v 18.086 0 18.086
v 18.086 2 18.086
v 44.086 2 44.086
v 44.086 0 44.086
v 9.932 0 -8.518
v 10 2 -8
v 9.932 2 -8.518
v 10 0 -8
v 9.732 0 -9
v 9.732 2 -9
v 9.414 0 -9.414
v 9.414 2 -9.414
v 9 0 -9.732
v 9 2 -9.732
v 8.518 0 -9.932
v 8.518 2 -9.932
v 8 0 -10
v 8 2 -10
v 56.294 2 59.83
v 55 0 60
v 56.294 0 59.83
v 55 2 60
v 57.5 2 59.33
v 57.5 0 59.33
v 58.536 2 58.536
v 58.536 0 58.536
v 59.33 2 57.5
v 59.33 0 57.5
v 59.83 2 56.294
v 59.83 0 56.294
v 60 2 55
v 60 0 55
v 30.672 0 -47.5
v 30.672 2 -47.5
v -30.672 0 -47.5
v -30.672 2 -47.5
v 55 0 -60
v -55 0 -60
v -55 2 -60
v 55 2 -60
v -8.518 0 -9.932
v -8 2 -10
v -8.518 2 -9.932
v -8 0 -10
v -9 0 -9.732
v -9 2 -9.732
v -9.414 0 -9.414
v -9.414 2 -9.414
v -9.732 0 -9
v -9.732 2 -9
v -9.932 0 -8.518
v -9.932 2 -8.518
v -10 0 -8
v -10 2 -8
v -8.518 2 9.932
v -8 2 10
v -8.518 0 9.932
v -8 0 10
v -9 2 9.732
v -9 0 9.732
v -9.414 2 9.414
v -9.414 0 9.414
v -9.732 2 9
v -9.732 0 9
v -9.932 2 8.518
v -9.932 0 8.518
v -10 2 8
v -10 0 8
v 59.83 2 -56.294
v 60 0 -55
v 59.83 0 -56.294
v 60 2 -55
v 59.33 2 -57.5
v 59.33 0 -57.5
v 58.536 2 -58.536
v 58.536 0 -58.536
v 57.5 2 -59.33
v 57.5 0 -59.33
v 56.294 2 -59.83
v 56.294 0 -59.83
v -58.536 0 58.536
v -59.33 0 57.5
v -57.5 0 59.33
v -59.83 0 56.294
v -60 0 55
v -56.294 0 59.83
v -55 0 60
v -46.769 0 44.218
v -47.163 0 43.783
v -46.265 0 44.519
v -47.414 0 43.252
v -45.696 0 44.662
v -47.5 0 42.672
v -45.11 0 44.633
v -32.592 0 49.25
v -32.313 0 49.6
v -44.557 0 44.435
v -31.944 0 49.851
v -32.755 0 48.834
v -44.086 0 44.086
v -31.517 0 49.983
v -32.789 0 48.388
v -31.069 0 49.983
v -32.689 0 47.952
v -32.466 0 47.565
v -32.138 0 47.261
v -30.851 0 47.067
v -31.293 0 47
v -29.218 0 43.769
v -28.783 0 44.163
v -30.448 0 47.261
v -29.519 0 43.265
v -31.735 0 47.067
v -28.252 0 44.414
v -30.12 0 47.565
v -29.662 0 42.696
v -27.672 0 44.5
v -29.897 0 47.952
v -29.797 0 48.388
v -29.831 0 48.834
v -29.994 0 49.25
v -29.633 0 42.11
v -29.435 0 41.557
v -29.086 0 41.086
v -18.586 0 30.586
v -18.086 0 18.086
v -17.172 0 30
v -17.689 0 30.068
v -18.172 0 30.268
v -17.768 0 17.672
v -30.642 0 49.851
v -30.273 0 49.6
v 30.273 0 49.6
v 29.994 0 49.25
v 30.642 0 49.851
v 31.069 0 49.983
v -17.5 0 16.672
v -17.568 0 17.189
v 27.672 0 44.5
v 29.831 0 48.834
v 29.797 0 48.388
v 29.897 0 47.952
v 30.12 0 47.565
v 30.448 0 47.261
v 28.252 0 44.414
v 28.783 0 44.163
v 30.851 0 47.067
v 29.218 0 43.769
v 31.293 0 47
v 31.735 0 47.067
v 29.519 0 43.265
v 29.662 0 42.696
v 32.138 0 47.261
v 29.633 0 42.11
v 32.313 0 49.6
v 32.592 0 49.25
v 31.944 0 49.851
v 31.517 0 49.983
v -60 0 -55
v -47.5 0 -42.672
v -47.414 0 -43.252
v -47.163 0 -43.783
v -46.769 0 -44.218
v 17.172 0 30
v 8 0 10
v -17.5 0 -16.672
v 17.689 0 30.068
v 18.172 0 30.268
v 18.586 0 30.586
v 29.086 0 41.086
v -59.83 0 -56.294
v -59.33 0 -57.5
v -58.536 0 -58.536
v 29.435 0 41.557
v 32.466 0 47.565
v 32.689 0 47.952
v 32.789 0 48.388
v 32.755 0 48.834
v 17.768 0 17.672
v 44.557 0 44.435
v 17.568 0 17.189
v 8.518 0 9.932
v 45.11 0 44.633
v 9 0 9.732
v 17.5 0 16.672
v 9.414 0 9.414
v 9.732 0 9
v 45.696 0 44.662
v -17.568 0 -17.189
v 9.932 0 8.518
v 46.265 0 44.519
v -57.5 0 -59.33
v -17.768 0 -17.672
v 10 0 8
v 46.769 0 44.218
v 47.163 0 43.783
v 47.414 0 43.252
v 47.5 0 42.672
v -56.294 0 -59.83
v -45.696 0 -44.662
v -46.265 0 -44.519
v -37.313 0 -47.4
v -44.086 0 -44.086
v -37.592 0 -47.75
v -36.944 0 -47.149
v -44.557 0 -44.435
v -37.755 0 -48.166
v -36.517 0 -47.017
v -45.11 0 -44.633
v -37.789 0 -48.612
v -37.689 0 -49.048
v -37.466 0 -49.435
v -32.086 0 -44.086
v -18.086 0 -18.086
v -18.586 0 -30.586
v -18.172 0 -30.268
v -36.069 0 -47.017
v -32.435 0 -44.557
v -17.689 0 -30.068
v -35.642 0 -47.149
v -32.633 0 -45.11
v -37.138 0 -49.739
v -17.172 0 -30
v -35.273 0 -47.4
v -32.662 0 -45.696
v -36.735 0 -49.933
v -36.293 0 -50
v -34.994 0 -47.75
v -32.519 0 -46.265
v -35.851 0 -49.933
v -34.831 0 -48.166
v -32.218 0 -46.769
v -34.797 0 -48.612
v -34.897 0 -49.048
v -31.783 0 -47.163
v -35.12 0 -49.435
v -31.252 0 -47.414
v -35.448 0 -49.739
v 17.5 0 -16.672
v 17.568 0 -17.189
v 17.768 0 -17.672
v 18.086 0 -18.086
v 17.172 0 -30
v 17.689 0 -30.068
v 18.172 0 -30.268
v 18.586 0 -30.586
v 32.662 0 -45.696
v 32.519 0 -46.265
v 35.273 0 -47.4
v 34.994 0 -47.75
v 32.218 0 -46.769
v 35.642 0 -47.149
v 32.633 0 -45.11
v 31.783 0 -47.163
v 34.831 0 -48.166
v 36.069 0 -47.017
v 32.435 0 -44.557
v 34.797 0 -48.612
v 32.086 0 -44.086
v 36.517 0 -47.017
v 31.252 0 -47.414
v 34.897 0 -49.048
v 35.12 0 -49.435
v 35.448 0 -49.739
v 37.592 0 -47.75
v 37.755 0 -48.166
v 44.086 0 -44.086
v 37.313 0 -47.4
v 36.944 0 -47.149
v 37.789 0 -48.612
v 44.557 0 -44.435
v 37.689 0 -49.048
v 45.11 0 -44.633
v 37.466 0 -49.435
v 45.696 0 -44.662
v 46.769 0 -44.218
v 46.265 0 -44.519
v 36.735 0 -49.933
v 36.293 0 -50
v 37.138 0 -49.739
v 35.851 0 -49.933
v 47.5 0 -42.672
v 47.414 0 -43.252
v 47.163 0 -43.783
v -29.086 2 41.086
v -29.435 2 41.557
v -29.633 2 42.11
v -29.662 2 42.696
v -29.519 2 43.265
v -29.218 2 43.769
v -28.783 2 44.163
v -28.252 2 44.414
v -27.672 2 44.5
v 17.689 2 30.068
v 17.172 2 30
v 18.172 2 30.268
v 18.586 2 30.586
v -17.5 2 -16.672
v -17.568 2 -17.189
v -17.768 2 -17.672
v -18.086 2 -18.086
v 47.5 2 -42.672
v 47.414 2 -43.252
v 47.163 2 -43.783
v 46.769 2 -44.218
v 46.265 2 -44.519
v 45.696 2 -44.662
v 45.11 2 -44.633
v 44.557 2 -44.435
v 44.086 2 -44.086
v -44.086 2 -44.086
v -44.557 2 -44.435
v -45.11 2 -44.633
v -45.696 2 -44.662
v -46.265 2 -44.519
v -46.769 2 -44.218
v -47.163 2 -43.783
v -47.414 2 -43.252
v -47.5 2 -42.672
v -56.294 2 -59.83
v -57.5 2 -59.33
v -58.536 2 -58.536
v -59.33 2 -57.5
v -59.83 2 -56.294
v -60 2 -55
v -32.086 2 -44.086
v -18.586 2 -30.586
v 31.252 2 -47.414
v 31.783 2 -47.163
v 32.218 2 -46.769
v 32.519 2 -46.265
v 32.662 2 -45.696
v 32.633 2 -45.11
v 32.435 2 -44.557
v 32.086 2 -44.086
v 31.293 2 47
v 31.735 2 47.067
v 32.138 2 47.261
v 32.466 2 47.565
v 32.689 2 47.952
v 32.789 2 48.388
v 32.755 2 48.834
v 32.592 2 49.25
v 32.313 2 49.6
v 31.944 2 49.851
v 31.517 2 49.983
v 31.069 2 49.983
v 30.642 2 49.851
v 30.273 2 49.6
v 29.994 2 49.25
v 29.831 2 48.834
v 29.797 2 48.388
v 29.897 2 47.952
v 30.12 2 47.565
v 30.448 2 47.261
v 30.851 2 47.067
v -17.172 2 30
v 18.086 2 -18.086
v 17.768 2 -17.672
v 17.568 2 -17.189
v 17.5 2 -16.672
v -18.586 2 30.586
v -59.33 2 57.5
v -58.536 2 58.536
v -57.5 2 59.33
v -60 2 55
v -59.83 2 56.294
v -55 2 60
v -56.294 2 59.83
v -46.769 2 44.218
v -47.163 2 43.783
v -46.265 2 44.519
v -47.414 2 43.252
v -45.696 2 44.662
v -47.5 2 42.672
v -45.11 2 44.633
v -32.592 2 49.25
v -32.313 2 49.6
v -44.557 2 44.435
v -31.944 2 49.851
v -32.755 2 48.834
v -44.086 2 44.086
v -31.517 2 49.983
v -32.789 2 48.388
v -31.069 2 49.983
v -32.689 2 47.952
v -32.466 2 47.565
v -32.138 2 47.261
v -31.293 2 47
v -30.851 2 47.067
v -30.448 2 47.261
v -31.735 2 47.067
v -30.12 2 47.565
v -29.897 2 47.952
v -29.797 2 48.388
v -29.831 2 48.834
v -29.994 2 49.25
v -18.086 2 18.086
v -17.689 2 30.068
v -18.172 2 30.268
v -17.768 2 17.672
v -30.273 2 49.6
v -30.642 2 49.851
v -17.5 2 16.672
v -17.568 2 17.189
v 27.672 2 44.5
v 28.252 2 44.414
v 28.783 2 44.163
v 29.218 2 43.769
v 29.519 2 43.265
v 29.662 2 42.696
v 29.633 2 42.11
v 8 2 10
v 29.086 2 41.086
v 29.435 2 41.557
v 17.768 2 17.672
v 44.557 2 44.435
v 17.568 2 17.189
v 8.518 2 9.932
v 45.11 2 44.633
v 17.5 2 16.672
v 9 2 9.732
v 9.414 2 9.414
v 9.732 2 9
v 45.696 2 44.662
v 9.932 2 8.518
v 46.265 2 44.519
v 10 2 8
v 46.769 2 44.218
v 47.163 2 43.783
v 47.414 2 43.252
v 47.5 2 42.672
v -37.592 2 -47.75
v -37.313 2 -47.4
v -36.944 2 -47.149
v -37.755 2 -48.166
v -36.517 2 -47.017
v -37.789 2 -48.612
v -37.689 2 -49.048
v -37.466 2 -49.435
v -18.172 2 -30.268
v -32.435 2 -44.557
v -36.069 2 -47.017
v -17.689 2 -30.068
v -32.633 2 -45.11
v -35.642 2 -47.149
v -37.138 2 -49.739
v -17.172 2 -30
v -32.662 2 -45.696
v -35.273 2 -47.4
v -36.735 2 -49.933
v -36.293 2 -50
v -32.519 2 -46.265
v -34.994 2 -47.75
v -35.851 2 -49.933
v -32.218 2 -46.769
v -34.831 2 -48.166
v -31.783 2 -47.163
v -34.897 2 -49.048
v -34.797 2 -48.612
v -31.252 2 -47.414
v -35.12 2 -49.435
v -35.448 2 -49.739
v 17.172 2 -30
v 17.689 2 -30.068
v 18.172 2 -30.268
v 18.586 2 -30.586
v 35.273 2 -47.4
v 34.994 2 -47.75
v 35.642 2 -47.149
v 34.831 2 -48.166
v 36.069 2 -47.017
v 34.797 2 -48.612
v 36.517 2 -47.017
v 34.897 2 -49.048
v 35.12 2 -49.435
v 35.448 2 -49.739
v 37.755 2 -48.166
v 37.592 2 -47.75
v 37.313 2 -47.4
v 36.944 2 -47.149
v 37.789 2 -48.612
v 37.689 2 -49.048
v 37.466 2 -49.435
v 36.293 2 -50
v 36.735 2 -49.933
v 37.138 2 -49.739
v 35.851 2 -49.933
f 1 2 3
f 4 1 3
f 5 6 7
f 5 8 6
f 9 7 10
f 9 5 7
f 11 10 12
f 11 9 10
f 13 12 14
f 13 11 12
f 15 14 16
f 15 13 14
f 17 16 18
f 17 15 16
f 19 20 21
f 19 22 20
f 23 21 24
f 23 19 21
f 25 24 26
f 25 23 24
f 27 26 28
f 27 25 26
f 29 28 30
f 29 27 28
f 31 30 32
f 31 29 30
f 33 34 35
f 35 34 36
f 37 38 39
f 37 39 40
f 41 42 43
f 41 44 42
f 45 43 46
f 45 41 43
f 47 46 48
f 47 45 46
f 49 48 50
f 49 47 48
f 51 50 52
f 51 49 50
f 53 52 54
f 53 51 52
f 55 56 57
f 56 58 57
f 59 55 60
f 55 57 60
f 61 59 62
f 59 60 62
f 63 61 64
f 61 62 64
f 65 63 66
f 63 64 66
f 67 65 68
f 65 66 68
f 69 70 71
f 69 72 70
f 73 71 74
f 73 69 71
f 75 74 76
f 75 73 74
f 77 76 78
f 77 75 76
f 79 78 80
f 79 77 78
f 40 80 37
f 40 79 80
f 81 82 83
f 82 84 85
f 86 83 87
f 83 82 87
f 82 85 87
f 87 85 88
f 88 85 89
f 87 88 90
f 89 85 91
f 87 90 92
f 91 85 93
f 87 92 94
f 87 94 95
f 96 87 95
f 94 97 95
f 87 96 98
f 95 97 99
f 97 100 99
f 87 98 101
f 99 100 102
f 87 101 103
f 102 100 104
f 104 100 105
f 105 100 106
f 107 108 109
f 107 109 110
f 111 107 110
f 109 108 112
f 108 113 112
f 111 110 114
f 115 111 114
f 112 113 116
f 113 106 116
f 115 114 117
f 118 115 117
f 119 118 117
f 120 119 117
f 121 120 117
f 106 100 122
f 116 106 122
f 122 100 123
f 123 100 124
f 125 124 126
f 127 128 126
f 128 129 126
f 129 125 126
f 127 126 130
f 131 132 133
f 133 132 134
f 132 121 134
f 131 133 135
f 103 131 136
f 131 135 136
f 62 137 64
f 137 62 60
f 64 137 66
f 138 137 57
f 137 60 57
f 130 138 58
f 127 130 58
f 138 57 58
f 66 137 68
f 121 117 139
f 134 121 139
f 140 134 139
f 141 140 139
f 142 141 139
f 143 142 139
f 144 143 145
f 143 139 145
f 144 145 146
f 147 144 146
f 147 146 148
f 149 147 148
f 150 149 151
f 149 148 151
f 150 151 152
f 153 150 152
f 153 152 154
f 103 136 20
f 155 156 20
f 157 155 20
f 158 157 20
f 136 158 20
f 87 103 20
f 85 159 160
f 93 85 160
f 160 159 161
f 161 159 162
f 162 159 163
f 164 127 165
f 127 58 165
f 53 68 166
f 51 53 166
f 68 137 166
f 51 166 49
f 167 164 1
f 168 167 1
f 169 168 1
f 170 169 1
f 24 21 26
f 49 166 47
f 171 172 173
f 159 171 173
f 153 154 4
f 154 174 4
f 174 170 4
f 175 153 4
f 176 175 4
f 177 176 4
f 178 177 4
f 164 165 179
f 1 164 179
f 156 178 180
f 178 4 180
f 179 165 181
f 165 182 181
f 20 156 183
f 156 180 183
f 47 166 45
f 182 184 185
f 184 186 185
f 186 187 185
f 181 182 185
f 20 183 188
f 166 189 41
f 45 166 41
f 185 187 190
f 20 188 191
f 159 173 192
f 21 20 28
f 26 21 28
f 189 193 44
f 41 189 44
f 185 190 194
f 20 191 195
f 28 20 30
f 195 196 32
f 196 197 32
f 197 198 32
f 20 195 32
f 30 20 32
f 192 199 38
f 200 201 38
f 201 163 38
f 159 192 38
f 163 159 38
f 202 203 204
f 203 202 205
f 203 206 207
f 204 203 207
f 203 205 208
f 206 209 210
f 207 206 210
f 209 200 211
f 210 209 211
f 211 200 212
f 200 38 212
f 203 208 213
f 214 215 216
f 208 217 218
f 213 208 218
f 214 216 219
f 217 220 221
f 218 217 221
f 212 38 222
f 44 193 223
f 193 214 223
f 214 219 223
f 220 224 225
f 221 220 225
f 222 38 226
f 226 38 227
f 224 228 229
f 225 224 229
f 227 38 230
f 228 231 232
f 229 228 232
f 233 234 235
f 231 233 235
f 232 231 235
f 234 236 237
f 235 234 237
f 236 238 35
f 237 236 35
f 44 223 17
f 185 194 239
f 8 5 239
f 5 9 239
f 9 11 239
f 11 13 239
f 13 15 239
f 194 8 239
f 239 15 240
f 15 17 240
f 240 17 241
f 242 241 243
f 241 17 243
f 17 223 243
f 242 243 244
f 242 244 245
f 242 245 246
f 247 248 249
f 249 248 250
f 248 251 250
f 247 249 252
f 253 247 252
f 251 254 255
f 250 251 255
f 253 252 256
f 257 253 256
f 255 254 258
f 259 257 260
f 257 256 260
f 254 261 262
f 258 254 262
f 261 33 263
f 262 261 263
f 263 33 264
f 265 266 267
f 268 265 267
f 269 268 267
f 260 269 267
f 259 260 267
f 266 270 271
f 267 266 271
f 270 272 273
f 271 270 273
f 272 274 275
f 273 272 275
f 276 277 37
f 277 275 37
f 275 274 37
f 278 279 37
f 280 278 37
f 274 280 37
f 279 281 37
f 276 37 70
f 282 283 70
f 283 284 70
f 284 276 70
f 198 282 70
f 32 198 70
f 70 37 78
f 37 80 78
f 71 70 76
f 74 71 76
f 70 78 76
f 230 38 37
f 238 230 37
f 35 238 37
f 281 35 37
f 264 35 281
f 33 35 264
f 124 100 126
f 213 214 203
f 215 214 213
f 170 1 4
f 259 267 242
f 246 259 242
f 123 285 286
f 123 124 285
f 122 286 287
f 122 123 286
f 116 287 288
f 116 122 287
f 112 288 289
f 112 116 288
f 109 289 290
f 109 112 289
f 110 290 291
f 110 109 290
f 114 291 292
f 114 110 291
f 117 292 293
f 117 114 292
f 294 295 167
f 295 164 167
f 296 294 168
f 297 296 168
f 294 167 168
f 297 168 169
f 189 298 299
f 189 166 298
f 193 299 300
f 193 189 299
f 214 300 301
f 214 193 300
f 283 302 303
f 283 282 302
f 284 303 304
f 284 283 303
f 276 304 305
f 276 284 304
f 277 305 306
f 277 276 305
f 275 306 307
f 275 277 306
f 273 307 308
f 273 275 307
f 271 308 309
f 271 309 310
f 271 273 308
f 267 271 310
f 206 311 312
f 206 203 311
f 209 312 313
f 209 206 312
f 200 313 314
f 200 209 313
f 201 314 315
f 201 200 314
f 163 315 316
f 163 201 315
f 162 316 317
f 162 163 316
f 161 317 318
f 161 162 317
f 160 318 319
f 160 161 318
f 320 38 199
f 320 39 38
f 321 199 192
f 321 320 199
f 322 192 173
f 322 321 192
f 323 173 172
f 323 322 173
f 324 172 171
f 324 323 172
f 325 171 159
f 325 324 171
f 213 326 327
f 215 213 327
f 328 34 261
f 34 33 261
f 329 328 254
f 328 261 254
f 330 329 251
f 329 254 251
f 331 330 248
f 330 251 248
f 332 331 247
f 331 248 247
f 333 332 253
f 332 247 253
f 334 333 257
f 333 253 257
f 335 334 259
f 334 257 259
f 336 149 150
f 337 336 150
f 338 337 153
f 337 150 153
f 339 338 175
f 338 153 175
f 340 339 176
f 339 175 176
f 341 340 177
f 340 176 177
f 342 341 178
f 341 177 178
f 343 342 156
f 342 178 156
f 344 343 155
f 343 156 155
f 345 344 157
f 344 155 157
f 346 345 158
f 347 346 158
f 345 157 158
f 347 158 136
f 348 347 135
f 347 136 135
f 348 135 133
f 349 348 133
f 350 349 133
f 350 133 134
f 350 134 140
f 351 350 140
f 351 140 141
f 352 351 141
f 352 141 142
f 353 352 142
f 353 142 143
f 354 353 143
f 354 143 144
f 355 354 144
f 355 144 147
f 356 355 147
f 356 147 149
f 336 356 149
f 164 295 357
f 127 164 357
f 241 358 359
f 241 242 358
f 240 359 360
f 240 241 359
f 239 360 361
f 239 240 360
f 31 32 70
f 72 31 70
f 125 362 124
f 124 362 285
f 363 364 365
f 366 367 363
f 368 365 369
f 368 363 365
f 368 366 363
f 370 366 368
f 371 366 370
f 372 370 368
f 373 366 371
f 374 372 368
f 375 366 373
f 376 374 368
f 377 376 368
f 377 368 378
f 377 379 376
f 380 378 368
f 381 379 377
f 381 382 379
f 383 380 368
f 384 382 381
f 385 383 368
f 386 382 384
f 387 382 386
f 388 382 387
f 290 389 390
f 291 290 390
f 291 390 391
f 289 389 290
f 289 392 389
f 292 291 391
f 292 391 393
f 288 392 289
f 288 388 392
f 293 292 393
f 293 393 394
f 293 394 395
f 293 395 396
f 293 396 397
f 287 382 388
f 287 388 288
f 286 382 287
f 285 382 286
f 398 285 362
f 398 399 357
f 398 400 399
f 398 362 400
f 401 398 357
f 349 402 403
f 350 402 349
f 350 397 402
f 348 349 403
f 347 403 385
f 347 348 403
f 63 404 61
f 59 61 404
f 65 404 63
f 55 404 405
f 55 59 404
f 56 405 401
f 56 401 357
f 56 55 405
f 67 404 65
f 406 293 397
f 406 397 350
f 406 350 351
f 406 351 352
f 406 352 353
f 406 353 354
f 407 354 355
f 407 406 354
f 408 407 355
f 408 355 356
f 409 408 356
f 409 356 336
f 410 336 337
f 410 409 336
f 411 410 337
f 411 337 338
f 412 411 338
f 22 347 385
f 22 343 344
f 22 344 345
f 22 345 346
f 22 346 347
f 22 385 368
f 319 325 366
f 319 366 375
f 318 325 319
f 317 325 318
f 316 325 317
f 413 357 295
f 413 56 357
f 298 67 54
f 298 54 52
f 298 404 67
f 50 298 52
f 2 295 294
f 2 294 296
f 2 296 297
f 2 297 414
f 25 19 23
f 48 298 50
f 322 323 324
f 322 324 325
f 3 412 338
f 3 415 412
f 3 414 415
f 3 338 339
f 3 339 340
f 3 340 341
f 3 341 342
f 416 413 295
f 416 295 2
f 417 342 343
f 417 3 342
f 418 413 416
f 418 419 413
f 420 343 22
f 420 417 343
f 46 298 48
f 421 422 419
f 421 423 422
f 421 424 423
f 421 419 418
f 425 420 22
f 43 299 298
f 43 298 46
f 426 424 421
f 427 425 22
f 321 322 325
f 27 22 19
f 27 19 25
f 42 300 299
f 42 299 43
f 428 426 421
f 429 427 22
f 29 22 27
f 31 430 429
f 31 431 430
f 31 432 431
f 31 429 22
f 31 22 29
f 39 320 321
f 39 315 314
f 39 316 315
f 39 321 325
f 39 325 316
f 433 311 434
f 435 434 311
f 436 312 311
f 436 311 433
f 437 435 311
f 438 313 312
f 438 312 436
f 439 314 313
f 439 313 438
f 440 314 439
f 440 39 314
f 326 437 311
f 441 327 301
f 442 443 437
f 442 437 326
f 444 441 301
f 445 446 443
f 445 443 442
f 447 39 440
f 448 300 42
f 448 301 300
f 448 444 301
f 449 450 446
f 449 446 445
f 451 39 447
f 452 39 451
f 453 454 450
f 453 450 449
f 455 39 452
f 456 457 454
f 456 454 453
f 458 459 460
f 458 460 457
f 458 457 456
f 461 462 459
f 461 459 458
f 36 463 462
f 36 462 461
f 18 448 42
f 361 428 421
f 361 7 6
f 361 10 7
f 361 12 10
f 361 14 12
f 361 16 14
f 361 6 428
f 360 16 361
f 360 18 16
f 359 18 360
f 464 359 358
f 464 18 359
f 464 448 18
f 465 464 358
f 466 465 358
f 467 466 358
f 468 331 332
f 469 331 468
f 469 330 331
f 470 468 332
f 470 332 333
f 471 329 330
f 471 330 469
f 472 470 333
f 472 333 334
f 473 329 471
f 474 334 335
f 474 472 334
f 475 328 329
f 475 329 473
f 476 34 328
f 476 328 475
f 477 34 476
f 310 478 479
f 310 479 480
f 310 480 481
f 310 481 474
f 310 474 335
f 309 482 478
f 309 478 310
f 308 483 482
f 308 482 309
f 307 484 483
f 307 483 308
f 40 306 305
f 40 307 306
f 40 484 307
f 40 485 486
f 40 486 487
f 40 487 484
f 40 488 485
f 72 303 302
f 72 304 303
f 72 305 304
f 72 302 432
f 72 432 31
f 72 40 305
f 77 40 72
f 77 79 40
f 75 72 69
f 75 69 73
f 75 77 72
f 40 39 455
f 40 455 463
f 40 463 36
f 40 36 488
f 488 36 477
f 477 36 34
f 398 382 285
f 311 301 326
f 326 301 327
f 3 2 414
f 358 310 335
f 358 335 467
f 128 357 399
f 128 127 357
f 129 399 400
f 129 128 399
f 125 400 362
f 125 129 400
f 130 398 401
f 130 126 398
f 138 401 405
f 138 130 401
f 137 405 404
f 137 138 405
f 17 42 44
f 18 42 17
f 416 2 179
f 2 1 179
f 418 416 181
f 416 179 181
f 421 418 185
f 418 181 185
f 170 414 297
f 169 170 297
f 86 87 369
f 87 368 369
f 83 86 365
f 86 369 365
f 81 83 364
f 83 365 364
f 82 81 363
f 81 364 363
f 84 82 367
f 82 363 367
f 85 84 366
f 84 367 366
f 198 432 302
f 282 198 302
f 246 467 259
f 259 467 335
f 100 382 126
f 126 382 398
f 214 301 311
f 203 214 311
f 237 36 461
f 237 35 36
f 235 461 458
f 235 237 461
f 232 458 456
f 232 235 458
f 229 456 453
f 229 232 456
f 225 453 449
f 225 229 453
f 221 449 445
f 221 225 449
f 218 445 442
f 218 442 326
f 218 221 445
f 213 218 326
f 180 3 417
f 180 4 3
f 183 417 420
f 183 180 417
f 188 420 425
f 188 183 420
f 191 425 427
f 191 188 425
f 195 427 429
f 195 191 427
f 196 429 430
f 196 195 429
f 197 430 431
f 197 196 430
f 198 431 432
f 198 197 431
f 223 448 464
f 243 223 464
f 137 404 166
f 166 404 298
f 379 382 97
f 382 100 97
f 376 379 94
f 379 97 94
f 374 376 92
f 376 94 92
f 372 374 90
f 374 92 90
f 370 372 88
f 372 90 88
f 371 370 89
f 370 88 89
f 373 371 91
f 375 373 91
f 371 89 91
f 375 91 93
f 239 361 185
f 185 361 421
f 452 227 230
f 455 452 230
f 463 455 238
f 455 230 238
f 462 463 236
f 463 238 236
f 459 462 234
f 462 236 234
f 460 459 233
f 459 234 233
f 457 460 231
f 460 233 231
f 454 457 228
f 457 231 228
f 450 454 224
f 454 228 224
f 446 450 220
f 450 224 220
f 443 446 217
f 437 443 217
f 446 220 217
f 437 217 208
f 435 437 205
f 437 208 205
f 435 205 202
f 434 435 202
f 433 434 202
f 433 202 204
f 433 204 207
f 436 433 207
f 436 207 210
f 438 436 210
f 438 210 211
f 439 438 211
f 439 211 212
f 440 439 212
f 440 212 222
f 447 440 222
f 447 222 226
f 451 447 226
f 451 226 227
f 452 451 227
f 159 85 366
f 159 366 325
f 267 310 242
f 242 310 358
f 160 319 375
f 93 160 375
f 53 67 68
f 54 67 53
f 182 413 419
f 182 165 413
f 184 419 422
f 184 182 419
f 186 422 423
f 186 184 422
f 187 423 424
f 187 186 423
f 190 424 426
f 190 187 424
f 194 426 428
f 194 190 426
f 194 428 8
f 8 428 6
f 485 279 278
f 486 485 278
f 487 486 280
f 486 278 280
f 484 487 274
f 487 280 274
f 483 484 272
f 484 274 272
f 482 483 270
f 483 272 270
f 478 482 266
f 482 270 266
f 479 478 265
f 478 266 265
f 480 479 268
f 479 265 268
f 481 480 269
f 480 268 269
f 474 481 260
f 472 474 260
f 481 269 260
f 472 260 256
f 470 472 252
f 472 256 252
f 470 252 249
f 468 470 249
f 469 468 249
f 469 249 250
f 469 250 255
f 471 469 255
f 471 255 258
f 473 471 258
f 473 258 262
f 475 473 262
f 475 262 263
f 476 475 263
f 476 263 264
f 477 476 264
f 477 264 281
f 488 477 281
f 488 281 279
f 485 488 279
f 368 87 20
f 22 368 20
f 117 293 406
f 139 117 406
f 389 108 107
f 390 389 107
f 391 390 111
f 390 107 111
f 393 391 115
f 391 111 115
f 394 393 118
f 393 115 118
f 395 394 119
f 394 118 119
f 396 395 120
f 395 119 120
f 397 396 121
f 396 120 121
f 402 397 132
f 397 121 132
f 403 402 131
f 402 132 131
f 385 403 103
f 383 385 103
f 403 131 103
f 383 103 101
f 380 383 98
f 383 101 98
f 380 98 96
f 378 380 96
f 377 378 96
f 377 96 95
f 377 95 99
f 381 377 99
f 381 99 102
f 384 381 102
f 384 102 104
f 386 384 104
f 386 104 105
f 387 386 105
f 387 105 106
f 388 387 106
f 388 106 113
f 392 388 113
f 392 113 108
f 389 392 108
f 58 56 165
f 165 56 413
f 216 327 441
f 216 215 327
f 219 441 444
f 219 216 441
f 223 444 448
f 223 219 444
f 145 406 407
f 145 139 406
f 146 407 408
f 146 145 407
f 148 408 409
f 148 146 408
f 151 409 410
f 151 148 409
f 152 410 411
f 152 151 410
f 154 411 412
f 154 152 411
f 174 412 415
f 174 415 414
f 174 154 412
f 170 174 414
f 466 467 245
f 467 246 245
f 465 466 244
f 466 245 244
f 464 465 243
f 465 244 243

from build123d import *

# Parameters (mm, degrees)
SKETCH1_W           = 120
SKETCH1_H           = 120
BOSS_EXTRUDE1_DEPTH = 2
FILLET1_R           = 5
FILLET2_R           = 5
FILLET3_R           = 5
FILLET4_R           = 5
SKETCH2_W           = 20
SKETCH2_H           = 20
CUT_EXTRUDE1_DEPTH  = 10
FILLET5_R           = 2
FILLET6_R           = 2
SKETCH4_R           = 1.5
CUT_EXTRUDE2_DEPTH  = 10


with BuildPart() as part:
    # Sketch1 → Boss-Extrude1 (new body)
    with BuildSketch(Plane(origin=(0, 0, 0), x_dir=(1, 0, 0), z_dir=(0, 1, 0))):
        Rectangle(SKETCH1_W, SKETCH1_H)
    extrude(amount=BOSS_EXTRUDE1_DEPTH)

    # Fillet1
    fillet1_edges = [part.edges().sort_by_distance(p)[0] for p in [
        (60, 1, 60),
    ]]
    fillet(fillet1_edges, radius=FILLET1_R)

    # Fillet2
    fillet2_edges = [part.edges().sort_by_distance(p)[0] for p in [
        (-60, 1, 60),
    ]]
    fillet(fillet2_edges, radius=FILLET2_R)

    # Fillet3
    fillet3_edges = [part.edges().sort_by_distance(p)[0] for p in [
        (60, 1, -60),
    ]]
    fillet(fillet3_edges, radius=FILLET3_R)

    # Fillet4
    fillet4_edges = [part.edges().sort_by_distance(p)[0] for p in [
        (-60, 1, -60),
    ]]
    fillet(fillet4_edges, radius=FILLET4_R)

    # Sketch2 → Cut-Extrude1 (cut)
    with BuildSketch(Plane(origin=(0, 2, 0), x_dir=(1, 0, 0), z_dir=(0, 1, 0))):
        Polygon((-47.5, -47.5), (-17.5, -17.5), (-17.5, 17.5), (-47.5, 47.5), align=None)
        Polygon((18, -30), (-18, -30), (-32.5, -44.5), (32.5, -44.5), align=None)
        Rectangle(SKETCH2_W, SKETCH2_H)
        Polygon((35.5, 47.5), (-35.5, 47.5), (-18, 30), (18, 30), align=None)
        Polygon((17.5, -17.5), (47.5, -47.5), (47.5, 47.5), (17.5, 17.5), align=None)
    extrude(amount=-CUT_EXTRUDE1_DEPTH, mode=Mode.SUBTRACT)

    # Fillet5
    fillet5_edges = [part.edges().sort_by_distance(p)[0] for p in [
        (-35.5, 1, -47.5),
        (35.5, 1, -47.5),
    ]]
    fillet(fillet5_edges, radius=FILLET5_R)

    # Fillet6
    fillet6_edges = [part.edges().sort_by_distance(p)[0] for p in [
        (-18, 1, -30),
        (18, 1, -30),
        (-32.5, 1, 44.5),
        (-18, 1, 30),
        (18, 1, 30),
        (32.5, 1, 44.5),
        (10, 1, 10),
        (-10, 1, 10),
        (-10, 1, -10),
        (10, 1, -10),
        (-17.5, 1, -17.5),
        (-17.5, 1, 17.5),
        (-47.5, 1, 47.5),
        (-47.5, 1, -47.5),
        (47.5, 1, -47.5),
        (47.5, 1, 47.5),
        (17.5, 1, 17.5),
        (17.5, 1, -17.5),
    ]]
    fillet(fillet6_edges, radius=FILLET6_R)

    # Sketch4 → Cut-Extrude2 (cut)
    with BuildSketch(Plane.XZ):
        with Locations(Location((-36.293024341, -48.5, 0), (0, 0, 270))):
            Circle(SKETCH4_R)
        with Locations(Location((-31.293024341, 48.5, 0), (0, 0, 270))):
            Circle(SKETCH4_R)
        with Locations(Location((31.293024341, 48.5, 0), (0, 0, 270))):
            Circle(SKETCH4_R)
        with Locations(Location((36.293024341, -48.5, 0), (0, 0, 270))):
            Circle(SKETCH4_R)
    extrude(amount=-CUT_EXTRUDE2_DEPTH, mode=Mode.SUBTRACT)


solid = part.part
